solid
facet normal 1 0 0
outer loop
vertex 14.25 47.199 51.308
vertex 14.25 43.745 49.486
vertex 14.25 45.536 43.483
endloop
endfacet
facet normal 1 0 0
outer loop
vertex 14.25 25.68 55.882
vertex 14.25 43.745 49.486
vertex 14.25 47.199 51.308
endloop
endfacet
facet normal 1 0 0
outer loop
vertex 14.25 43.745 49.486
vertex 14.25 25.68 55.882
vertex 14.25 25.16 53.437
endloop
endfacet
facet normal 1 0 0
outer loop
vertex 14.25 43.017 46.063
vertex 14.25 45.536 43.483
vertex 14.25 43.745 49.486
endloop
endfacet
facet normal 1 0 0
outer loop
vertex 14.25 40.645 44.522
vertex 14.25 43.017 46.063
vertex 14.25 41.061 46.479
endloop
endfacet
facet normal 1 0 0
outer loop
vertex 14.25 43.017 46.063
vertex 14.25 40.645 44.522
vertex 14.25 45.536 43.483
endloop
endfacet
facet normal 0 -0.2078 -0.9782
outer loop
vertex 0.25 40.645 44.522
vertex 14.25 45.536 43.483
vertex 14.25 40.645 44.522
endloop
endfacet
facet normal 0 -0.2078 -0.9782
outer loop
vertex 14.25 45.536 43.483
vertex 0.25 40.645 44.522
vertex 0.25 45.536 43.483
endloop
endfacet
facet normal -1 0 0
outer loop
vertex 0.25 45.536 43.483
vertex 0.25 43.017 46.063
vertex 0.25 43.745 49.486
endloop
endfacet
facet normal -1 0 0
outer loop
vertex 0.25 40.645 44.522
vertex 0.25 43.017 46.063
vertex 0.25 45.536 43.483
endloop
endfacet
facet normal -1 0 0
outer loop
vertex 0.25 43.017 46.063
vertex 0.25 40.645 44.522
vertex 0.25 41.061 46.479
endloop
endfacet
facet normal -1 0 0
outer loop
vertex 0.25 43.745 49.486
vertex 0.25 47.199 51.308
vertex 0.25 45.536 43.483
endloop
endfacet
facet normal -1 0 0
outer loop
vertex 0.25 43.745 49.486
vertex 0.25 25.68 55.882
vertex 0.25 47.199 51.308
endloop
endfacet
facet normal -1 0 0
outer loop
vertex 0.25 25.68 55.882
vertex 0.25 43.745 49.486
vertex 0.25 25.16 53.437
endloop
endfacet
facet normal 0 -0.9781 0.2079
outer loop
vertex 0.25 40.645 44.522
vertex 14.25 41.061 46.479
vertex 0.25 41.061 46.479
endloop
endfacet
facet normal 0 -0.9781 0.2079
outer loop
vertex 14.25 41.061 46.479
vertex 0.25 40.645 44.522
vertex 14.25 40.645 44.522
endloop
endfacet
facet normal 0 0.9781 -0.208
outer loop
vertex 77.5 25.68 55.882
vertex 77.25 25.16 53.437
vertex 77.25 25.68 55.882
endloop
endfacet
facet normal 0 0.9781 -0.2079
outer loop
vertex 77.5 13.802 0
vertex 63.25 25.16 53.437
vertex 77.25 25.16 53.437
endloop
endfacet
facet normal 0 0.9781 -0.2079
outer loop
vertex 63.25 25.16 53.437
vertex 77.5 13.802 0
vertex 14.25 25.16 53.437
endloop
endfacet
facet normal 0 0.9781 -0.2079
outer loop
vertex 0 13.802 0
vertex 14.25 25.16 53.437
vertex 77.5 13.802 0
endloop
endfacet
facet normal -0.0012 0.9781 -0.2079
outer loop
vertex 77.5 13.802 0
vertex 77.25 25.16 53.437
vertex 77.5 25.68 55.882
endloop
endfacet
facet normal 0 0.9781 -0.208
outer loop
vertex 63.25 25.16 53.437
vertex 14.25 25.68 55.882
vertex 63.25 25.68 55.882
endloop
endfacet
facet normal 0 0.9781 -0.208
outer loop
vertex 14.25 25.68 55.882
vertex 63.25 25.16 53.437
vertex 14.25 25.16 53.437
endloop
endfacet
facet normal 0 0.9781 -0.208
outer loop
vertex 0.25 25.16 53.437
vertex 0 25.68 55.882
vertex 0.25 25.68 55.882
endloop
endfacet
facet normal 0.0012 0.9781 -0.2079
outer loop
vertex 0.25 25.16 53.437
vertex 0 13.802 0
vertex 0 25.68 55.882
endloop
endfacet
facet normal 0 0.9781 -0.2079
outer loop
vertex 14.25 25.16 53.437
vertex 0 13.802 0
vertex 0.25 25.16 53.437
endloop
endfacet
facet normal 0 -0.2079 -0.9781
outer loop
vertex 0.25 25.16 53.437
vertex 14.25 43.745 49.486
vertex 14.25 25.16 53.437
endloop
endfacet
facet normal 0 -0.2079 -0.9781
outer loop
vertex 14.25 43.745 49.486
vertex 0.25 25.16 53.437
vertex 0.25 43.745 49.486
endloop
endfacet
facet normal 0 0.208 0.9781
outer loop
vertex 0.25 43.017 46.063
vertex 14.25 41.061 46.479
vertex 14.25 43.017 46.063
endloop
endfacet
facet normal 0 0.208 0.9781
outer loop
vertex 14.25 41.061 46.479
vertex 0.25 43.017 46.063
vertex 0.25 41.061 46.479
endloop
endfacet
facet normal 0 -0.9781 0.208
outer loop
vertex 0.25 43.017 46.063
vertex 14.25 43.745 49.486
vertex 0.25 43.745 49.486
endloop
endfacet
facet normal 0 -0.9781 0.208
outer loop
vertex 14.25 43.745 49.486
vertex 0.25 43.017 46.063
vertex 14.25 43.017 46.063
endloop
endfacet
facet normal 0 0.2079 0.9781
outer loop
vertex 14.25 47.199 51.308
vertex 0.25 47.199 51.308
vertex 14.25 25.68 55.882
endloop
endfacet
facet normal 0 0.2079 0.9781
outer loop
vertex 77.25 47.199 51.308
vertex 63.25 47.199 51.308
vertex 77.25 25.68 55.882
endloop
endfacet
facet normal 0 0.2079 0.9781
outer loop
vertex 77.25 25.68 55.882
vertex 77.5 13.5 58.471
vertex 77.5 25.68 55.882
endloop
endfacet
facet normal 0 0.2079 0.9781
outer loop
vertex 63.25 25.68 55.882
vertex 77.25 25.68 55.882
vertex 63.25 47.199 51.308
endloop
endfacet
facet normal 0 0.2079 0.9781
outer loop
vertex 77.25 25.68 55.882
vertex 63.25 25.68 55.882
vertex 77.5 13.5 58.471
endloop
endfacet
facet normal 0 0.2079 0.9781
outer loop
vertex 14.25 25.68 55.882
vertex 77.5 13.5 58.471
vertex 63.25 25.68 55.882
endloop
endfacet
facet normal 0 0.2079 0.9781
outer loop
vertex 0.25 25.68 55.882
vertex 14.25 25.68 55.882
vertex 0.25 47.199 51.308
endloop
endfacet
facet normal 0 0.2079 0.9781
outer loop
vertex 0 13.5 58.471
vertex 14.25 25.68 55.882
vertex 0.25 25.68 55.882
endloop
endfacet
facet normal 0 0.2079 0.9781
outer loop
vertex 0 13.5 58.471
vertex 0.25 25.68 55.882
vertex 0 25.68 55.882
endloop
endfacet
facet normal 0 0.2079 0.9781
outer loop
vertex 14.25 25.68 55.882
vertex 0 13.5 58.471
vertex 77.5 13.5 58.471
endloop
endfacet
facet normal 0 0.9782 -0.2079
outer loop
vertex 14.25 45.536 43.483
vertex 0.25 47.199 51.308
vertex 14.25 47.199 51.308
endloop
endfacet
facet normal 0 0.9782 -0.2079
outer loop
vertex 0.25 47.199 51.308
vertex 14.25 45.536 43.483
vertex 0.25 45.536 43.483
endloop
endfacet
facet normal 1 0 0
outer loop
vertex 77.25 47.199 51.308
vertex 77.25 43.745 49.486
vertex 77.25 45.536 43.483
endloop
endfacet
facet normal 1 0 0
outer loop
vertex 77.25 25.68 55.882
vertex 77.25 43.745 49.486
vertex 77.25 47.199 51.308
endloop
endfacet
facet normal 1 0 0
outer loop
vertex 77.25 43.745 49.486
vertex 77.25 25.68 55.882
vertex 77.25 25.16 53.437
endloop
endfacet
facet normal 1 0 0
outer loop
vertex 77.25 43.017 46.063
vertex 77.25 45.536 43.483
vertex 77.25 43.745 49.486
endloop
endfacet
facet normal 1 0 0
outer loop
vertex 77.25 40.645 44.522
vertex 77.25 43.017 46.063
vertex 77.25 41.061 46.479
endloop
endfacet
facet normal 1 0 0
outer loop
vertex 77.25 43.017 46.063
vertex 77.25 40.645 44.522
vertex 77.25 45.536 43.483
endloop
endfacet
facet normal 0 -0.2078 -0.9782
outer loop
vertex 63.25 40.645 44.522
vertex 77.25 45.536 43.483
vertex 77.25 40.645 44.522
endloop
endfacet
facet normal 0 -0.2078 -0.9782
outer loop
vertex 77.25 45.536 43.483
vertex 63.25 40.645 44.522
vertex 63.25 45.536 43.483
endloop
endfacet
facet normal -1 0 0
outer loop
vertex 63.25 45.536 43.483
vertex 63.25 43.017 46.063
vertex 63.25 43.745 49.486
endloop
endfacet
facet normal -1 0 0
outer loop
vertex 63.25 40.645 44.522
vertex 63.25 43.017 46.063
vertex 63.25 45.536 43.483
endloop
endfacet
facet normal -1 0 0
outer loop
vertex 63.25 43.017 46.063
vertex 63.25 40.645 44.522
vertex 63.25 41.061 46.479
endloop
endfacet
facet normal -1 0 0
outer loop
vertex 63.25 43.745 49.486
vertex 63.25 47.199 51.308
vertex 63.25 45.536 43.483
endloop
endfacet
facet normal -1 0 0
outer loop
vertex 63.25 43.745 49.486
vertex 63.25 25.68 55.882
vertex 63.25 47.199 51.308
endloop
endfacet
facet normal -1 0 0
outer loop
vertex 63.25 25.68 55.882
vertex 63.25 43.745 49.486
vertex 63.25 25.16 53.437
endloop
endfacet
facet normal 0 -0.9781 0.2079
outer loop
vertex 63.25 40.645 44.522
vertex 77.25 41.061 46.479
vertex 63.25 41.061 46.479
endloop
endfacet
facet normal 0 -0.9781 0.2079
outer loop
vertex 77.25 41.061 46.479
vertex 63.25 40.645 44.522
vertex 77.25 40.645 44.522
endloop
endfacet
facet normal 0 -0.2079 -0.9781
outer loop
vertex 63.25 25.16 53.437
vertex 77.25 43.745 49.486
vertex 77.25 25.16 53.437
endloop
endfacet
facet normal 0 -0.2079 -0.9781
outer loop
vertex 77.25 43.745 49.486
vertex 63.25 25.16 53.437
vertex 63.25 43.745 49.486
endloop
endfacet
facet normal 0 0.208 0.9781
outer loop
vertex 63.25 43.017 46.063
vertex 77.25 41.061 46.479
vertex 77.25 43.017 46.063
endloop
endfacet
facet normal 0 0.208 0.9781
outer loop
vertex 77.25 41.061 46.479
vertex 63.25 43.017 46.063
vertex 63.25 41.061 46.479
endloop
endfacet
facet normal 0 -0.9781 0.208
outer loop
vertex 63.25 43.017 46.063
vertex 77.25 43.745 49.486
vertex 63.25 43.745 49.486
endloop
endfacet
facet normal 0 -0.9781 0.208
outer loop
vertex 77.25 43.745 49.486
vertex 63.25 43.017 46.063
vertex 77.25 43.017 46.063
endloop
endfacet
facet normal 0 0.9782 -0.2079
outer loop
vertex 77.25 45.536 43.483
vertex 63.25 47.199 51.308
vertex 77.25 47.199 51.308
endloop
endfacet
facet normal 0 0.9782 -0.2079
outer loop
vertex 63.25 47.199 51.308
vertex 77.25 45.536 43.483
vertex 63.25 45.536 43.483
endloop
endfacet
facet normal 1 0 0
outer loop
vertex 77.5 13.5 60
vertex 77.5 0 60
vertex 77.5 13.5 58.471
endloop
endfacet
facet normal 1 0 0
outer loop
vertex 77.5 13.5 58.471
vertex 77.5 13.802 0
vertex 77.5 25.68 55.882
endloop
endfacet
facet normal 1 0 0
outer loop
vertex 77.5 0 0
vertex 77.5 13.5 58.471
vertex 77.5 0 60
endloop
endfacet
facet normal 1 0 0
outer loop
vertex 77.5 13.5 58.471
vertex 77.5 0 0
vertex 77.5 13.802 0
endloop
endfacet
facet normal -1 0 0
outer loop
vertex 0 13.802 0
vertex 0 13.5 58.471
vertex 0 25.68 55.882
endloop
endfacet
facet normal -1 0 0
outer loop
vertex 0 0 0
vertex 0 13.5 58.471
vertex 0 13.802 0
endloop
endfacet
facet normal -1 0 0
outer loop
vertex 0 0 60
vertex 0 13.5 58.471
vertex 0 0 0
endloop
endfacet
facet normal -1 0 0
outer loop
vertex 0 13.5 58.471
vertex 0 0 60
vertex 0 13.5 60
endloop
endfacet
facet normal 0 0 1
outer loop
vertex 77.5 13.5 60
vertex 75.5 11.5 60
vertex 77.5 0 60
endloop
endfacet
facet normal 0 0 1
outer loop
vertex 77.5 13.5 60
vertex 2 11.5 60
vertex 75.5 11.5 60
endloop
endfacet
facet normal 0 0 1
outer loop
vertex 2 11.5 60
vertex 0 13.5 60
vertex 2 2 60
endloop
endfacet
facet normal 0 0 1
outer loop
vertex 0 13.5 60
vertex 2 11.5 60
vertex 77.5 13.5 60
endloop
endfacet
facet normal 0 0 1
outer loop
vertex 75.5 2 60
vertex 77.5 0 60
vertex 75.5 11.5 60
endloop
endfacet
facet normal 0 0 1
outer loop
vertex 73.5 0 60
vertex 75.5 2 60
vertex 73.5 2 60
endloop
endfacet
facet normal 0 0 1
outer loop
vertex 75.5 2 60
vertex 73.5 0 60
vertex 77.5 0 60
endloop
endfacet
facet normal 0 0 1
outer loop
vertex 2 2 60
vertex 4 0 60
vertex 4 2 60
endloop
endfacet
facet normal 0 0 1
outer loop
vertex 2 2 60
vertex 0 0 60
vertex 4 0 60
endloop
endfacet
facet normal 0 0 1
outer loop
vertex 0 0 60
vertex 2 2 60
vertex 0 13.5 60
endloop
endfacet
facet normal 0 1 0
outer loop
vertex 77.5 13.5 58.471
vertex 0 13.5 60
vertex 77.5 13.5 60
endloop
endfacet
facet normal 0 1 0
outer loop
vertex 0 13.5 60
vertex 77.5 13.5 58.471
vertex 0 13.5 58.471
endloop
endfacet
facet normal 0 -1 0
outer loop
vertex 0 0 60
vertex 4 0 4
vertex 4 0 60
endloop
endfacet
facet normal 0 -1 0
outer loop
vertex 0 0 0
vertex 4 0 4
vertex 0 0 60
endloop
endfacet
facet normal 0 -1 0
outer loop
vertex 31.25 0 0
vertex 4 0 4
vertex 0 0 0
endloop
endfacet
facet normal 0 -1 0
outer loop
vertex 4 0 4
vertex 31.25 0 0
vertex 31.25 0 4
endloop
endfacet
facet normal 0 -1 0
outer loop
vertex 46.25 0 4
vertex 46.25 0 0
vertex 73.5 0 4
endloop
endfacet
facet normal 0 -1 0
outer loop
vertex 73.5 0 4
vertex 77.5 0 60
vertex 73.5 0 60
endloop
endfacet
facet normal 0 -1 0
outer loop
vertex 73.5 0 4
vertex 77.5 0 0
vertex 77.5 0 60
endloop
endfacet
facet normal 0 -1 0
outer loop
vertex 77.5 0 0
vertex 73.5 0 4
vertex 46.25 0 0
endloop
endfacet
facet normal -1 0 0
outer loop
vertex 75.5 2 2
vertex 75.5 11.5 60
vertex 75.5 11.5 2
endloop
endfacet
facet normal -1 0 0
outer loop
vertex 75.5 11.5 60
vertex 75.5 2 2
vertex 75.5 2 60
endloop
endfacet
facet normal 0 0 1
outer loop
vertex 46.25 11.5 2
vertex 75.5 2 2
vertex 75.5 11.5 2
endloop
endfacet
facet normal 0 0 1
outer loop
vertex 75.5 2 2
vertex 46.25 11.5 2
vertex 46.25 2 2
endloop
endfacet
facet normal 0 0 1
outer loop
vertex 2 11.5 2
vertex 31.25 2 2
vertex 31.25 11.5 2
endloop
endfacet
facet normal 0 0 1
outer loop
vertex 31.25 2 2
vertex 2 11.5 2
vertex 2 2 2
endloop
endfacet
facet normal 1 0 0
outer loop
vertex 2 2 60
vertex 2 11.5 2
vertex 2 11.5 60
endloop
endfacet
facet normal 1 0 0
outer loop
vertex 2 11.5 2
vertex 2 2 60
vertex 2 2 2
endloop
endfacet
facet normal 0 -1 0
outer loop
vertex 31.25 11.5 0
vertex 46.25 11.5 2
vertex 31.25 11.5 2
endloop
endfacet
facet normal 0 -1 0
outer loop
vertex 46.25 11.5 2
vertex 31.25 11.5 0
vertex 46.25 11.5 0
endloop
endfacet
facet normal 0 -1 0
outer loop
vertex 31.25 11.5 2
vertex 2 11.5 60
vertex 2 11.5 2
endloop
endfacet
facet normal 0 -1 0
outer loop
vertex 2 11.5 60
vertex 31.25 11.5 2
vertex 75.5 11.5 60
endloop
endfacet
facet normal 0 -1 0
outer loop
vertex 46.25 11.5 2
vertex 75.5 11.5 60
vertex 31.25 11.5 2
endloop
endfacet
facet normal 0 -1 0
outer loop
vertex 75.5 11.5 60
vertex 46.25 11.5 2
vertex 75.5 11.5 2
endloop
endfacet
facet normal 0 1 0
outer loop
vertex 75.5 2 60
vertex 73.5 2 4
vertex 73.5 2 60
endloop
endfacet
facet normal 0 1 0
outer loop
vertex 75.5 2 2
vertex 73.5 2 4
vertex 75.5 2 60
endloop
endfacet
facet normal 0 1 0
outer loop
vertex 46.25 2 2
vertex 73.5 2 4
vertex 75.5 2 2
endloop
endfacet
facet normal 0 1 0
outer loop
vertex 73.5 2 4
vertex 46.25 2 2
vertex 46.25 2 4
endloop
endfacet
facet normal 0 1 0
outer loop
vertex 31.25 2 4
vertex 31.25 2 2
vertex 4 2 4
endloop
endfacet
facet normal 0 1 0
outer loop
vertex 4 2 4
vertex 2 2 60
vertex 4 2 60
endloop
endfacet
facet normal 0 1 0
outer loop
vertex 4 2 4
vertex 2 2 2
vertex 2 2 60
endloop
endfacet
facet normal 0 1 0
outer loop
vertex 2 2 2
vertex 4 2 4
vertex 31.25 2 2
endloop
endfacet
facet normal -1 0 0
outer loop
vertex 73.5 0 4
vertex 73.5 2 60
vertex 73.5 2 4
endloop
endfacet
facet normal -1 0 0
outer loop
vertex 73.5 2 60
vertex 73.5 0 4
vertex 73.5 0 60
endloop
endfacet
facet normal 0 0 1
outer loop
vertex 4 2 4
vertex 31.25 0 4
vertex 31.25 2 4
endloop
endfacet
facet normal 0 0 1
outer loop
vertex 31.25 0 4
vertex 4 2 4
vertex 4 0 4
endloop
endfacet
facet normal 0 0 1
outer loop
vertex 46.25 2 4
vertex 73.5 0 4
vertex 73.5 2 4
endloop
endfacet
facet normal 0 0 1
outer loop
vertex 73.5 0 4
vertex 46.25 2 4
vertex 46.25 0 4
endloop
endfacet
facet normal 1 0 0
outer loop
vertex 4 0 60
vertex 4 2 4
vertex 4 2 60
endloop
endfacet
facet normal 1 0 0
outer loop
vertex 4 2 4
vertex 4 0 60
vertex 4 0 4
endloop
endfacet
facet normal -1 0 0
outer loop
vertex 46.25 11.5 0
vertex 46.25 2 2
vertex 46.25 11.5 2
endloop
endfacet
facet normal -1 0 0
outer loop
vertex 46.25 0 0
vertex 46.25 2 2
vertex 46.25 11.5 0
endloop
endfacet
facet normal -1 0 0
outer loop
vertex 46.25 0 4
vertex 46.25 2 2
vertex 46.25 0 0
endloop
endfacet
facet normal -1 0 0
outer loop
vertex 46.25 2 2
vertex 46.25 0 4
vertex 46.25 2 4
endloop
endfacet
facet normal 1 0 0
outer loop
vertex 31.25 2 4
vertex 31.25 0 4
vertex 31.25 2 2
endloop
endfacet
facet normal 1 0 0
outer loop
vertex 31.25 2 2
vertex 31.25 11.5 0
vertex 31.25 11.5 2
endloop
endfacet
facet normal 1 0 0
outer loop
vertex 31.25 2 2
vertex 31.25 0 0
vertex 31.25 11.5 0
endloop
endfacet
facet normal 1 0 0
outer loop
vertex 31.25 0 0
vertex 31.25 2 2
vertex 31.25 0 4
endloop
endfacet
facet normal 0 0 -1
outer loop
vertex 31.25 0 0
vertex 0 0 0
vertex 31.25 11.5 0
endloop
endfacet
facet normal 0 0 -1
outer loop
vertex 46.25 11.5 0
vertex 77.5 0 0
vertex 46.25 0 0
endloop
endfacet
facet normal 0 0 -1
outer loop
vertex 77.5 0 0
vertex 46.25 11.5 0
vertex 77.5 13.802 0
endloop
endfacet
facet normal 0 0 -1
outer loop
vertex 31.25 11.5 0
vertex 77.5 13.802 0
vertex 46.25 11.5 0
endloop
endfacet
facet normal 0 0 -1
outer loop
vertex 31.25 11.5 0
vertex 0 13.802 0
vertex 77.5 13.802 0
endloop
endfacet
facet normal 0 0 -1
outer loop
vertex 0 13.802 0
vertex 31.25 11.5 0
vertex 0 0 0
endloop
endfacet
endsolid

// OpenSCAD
// Change these for other phones

phone_thickness=9.5;
phone_width=73.5;

// Change these for  other cars
vent_hole_height=8; 
vent_hole_width=14;
vent_hole_distance=77;
vent_thickness=3.5;
vent_depth=17;

angle=12;
height=60;

wall_thickness=2;

center=(phone_width+2*wall_thickness)/2;

module hook () {
    difference() {
        cube([vent_hole_width,vent_depth+5,vent_hole_height]);
        union() {
            cube([vent_hole_width,vent_depth,vent_hole_height/2]);
            translate([0,0,2]) cube([vent_hole_width,vent_depth+2,vent_thickness]);
        }
    }
}

difference() {
    union() {
        cube([phone_width+(2*wall_thickness),phone_thickness+(2*wall_thickness),height]);
        rotate([-angle,0,0]) {
            cube([phone_width+(2*wall_thickness),phone_thickness+(2*wall_thickness),height]);
            translate([center-vent_hole_distance/2,phone_thickness+2*wall_thickness,height-vent_hole_height])
                hook();
            translate([center+vent_hole_distance/2-vent_hole_width,phone_thickness+2*wall_thickness,height-vent_hole_height])
                hook();
                }
    }
    union() {
        translate([wall_thickness,wall_thickness,wall_thickness]) 
            cube([phone_width,phone_thickness,phone_width]);
        translate([wall_thickness*2,0,wall_thickness*2]) 
            cube([phone_width-2*wall_thickness,phone_thickness,height]);
        translate([center-7.5,0,-10]) 
            cube([15,phone_thickness+wall_thickness,10+wall_thickness*2]);
        translate([0,0,-10]) cube([2*phone_width,2*phone_thickness,10]);
    }
}
